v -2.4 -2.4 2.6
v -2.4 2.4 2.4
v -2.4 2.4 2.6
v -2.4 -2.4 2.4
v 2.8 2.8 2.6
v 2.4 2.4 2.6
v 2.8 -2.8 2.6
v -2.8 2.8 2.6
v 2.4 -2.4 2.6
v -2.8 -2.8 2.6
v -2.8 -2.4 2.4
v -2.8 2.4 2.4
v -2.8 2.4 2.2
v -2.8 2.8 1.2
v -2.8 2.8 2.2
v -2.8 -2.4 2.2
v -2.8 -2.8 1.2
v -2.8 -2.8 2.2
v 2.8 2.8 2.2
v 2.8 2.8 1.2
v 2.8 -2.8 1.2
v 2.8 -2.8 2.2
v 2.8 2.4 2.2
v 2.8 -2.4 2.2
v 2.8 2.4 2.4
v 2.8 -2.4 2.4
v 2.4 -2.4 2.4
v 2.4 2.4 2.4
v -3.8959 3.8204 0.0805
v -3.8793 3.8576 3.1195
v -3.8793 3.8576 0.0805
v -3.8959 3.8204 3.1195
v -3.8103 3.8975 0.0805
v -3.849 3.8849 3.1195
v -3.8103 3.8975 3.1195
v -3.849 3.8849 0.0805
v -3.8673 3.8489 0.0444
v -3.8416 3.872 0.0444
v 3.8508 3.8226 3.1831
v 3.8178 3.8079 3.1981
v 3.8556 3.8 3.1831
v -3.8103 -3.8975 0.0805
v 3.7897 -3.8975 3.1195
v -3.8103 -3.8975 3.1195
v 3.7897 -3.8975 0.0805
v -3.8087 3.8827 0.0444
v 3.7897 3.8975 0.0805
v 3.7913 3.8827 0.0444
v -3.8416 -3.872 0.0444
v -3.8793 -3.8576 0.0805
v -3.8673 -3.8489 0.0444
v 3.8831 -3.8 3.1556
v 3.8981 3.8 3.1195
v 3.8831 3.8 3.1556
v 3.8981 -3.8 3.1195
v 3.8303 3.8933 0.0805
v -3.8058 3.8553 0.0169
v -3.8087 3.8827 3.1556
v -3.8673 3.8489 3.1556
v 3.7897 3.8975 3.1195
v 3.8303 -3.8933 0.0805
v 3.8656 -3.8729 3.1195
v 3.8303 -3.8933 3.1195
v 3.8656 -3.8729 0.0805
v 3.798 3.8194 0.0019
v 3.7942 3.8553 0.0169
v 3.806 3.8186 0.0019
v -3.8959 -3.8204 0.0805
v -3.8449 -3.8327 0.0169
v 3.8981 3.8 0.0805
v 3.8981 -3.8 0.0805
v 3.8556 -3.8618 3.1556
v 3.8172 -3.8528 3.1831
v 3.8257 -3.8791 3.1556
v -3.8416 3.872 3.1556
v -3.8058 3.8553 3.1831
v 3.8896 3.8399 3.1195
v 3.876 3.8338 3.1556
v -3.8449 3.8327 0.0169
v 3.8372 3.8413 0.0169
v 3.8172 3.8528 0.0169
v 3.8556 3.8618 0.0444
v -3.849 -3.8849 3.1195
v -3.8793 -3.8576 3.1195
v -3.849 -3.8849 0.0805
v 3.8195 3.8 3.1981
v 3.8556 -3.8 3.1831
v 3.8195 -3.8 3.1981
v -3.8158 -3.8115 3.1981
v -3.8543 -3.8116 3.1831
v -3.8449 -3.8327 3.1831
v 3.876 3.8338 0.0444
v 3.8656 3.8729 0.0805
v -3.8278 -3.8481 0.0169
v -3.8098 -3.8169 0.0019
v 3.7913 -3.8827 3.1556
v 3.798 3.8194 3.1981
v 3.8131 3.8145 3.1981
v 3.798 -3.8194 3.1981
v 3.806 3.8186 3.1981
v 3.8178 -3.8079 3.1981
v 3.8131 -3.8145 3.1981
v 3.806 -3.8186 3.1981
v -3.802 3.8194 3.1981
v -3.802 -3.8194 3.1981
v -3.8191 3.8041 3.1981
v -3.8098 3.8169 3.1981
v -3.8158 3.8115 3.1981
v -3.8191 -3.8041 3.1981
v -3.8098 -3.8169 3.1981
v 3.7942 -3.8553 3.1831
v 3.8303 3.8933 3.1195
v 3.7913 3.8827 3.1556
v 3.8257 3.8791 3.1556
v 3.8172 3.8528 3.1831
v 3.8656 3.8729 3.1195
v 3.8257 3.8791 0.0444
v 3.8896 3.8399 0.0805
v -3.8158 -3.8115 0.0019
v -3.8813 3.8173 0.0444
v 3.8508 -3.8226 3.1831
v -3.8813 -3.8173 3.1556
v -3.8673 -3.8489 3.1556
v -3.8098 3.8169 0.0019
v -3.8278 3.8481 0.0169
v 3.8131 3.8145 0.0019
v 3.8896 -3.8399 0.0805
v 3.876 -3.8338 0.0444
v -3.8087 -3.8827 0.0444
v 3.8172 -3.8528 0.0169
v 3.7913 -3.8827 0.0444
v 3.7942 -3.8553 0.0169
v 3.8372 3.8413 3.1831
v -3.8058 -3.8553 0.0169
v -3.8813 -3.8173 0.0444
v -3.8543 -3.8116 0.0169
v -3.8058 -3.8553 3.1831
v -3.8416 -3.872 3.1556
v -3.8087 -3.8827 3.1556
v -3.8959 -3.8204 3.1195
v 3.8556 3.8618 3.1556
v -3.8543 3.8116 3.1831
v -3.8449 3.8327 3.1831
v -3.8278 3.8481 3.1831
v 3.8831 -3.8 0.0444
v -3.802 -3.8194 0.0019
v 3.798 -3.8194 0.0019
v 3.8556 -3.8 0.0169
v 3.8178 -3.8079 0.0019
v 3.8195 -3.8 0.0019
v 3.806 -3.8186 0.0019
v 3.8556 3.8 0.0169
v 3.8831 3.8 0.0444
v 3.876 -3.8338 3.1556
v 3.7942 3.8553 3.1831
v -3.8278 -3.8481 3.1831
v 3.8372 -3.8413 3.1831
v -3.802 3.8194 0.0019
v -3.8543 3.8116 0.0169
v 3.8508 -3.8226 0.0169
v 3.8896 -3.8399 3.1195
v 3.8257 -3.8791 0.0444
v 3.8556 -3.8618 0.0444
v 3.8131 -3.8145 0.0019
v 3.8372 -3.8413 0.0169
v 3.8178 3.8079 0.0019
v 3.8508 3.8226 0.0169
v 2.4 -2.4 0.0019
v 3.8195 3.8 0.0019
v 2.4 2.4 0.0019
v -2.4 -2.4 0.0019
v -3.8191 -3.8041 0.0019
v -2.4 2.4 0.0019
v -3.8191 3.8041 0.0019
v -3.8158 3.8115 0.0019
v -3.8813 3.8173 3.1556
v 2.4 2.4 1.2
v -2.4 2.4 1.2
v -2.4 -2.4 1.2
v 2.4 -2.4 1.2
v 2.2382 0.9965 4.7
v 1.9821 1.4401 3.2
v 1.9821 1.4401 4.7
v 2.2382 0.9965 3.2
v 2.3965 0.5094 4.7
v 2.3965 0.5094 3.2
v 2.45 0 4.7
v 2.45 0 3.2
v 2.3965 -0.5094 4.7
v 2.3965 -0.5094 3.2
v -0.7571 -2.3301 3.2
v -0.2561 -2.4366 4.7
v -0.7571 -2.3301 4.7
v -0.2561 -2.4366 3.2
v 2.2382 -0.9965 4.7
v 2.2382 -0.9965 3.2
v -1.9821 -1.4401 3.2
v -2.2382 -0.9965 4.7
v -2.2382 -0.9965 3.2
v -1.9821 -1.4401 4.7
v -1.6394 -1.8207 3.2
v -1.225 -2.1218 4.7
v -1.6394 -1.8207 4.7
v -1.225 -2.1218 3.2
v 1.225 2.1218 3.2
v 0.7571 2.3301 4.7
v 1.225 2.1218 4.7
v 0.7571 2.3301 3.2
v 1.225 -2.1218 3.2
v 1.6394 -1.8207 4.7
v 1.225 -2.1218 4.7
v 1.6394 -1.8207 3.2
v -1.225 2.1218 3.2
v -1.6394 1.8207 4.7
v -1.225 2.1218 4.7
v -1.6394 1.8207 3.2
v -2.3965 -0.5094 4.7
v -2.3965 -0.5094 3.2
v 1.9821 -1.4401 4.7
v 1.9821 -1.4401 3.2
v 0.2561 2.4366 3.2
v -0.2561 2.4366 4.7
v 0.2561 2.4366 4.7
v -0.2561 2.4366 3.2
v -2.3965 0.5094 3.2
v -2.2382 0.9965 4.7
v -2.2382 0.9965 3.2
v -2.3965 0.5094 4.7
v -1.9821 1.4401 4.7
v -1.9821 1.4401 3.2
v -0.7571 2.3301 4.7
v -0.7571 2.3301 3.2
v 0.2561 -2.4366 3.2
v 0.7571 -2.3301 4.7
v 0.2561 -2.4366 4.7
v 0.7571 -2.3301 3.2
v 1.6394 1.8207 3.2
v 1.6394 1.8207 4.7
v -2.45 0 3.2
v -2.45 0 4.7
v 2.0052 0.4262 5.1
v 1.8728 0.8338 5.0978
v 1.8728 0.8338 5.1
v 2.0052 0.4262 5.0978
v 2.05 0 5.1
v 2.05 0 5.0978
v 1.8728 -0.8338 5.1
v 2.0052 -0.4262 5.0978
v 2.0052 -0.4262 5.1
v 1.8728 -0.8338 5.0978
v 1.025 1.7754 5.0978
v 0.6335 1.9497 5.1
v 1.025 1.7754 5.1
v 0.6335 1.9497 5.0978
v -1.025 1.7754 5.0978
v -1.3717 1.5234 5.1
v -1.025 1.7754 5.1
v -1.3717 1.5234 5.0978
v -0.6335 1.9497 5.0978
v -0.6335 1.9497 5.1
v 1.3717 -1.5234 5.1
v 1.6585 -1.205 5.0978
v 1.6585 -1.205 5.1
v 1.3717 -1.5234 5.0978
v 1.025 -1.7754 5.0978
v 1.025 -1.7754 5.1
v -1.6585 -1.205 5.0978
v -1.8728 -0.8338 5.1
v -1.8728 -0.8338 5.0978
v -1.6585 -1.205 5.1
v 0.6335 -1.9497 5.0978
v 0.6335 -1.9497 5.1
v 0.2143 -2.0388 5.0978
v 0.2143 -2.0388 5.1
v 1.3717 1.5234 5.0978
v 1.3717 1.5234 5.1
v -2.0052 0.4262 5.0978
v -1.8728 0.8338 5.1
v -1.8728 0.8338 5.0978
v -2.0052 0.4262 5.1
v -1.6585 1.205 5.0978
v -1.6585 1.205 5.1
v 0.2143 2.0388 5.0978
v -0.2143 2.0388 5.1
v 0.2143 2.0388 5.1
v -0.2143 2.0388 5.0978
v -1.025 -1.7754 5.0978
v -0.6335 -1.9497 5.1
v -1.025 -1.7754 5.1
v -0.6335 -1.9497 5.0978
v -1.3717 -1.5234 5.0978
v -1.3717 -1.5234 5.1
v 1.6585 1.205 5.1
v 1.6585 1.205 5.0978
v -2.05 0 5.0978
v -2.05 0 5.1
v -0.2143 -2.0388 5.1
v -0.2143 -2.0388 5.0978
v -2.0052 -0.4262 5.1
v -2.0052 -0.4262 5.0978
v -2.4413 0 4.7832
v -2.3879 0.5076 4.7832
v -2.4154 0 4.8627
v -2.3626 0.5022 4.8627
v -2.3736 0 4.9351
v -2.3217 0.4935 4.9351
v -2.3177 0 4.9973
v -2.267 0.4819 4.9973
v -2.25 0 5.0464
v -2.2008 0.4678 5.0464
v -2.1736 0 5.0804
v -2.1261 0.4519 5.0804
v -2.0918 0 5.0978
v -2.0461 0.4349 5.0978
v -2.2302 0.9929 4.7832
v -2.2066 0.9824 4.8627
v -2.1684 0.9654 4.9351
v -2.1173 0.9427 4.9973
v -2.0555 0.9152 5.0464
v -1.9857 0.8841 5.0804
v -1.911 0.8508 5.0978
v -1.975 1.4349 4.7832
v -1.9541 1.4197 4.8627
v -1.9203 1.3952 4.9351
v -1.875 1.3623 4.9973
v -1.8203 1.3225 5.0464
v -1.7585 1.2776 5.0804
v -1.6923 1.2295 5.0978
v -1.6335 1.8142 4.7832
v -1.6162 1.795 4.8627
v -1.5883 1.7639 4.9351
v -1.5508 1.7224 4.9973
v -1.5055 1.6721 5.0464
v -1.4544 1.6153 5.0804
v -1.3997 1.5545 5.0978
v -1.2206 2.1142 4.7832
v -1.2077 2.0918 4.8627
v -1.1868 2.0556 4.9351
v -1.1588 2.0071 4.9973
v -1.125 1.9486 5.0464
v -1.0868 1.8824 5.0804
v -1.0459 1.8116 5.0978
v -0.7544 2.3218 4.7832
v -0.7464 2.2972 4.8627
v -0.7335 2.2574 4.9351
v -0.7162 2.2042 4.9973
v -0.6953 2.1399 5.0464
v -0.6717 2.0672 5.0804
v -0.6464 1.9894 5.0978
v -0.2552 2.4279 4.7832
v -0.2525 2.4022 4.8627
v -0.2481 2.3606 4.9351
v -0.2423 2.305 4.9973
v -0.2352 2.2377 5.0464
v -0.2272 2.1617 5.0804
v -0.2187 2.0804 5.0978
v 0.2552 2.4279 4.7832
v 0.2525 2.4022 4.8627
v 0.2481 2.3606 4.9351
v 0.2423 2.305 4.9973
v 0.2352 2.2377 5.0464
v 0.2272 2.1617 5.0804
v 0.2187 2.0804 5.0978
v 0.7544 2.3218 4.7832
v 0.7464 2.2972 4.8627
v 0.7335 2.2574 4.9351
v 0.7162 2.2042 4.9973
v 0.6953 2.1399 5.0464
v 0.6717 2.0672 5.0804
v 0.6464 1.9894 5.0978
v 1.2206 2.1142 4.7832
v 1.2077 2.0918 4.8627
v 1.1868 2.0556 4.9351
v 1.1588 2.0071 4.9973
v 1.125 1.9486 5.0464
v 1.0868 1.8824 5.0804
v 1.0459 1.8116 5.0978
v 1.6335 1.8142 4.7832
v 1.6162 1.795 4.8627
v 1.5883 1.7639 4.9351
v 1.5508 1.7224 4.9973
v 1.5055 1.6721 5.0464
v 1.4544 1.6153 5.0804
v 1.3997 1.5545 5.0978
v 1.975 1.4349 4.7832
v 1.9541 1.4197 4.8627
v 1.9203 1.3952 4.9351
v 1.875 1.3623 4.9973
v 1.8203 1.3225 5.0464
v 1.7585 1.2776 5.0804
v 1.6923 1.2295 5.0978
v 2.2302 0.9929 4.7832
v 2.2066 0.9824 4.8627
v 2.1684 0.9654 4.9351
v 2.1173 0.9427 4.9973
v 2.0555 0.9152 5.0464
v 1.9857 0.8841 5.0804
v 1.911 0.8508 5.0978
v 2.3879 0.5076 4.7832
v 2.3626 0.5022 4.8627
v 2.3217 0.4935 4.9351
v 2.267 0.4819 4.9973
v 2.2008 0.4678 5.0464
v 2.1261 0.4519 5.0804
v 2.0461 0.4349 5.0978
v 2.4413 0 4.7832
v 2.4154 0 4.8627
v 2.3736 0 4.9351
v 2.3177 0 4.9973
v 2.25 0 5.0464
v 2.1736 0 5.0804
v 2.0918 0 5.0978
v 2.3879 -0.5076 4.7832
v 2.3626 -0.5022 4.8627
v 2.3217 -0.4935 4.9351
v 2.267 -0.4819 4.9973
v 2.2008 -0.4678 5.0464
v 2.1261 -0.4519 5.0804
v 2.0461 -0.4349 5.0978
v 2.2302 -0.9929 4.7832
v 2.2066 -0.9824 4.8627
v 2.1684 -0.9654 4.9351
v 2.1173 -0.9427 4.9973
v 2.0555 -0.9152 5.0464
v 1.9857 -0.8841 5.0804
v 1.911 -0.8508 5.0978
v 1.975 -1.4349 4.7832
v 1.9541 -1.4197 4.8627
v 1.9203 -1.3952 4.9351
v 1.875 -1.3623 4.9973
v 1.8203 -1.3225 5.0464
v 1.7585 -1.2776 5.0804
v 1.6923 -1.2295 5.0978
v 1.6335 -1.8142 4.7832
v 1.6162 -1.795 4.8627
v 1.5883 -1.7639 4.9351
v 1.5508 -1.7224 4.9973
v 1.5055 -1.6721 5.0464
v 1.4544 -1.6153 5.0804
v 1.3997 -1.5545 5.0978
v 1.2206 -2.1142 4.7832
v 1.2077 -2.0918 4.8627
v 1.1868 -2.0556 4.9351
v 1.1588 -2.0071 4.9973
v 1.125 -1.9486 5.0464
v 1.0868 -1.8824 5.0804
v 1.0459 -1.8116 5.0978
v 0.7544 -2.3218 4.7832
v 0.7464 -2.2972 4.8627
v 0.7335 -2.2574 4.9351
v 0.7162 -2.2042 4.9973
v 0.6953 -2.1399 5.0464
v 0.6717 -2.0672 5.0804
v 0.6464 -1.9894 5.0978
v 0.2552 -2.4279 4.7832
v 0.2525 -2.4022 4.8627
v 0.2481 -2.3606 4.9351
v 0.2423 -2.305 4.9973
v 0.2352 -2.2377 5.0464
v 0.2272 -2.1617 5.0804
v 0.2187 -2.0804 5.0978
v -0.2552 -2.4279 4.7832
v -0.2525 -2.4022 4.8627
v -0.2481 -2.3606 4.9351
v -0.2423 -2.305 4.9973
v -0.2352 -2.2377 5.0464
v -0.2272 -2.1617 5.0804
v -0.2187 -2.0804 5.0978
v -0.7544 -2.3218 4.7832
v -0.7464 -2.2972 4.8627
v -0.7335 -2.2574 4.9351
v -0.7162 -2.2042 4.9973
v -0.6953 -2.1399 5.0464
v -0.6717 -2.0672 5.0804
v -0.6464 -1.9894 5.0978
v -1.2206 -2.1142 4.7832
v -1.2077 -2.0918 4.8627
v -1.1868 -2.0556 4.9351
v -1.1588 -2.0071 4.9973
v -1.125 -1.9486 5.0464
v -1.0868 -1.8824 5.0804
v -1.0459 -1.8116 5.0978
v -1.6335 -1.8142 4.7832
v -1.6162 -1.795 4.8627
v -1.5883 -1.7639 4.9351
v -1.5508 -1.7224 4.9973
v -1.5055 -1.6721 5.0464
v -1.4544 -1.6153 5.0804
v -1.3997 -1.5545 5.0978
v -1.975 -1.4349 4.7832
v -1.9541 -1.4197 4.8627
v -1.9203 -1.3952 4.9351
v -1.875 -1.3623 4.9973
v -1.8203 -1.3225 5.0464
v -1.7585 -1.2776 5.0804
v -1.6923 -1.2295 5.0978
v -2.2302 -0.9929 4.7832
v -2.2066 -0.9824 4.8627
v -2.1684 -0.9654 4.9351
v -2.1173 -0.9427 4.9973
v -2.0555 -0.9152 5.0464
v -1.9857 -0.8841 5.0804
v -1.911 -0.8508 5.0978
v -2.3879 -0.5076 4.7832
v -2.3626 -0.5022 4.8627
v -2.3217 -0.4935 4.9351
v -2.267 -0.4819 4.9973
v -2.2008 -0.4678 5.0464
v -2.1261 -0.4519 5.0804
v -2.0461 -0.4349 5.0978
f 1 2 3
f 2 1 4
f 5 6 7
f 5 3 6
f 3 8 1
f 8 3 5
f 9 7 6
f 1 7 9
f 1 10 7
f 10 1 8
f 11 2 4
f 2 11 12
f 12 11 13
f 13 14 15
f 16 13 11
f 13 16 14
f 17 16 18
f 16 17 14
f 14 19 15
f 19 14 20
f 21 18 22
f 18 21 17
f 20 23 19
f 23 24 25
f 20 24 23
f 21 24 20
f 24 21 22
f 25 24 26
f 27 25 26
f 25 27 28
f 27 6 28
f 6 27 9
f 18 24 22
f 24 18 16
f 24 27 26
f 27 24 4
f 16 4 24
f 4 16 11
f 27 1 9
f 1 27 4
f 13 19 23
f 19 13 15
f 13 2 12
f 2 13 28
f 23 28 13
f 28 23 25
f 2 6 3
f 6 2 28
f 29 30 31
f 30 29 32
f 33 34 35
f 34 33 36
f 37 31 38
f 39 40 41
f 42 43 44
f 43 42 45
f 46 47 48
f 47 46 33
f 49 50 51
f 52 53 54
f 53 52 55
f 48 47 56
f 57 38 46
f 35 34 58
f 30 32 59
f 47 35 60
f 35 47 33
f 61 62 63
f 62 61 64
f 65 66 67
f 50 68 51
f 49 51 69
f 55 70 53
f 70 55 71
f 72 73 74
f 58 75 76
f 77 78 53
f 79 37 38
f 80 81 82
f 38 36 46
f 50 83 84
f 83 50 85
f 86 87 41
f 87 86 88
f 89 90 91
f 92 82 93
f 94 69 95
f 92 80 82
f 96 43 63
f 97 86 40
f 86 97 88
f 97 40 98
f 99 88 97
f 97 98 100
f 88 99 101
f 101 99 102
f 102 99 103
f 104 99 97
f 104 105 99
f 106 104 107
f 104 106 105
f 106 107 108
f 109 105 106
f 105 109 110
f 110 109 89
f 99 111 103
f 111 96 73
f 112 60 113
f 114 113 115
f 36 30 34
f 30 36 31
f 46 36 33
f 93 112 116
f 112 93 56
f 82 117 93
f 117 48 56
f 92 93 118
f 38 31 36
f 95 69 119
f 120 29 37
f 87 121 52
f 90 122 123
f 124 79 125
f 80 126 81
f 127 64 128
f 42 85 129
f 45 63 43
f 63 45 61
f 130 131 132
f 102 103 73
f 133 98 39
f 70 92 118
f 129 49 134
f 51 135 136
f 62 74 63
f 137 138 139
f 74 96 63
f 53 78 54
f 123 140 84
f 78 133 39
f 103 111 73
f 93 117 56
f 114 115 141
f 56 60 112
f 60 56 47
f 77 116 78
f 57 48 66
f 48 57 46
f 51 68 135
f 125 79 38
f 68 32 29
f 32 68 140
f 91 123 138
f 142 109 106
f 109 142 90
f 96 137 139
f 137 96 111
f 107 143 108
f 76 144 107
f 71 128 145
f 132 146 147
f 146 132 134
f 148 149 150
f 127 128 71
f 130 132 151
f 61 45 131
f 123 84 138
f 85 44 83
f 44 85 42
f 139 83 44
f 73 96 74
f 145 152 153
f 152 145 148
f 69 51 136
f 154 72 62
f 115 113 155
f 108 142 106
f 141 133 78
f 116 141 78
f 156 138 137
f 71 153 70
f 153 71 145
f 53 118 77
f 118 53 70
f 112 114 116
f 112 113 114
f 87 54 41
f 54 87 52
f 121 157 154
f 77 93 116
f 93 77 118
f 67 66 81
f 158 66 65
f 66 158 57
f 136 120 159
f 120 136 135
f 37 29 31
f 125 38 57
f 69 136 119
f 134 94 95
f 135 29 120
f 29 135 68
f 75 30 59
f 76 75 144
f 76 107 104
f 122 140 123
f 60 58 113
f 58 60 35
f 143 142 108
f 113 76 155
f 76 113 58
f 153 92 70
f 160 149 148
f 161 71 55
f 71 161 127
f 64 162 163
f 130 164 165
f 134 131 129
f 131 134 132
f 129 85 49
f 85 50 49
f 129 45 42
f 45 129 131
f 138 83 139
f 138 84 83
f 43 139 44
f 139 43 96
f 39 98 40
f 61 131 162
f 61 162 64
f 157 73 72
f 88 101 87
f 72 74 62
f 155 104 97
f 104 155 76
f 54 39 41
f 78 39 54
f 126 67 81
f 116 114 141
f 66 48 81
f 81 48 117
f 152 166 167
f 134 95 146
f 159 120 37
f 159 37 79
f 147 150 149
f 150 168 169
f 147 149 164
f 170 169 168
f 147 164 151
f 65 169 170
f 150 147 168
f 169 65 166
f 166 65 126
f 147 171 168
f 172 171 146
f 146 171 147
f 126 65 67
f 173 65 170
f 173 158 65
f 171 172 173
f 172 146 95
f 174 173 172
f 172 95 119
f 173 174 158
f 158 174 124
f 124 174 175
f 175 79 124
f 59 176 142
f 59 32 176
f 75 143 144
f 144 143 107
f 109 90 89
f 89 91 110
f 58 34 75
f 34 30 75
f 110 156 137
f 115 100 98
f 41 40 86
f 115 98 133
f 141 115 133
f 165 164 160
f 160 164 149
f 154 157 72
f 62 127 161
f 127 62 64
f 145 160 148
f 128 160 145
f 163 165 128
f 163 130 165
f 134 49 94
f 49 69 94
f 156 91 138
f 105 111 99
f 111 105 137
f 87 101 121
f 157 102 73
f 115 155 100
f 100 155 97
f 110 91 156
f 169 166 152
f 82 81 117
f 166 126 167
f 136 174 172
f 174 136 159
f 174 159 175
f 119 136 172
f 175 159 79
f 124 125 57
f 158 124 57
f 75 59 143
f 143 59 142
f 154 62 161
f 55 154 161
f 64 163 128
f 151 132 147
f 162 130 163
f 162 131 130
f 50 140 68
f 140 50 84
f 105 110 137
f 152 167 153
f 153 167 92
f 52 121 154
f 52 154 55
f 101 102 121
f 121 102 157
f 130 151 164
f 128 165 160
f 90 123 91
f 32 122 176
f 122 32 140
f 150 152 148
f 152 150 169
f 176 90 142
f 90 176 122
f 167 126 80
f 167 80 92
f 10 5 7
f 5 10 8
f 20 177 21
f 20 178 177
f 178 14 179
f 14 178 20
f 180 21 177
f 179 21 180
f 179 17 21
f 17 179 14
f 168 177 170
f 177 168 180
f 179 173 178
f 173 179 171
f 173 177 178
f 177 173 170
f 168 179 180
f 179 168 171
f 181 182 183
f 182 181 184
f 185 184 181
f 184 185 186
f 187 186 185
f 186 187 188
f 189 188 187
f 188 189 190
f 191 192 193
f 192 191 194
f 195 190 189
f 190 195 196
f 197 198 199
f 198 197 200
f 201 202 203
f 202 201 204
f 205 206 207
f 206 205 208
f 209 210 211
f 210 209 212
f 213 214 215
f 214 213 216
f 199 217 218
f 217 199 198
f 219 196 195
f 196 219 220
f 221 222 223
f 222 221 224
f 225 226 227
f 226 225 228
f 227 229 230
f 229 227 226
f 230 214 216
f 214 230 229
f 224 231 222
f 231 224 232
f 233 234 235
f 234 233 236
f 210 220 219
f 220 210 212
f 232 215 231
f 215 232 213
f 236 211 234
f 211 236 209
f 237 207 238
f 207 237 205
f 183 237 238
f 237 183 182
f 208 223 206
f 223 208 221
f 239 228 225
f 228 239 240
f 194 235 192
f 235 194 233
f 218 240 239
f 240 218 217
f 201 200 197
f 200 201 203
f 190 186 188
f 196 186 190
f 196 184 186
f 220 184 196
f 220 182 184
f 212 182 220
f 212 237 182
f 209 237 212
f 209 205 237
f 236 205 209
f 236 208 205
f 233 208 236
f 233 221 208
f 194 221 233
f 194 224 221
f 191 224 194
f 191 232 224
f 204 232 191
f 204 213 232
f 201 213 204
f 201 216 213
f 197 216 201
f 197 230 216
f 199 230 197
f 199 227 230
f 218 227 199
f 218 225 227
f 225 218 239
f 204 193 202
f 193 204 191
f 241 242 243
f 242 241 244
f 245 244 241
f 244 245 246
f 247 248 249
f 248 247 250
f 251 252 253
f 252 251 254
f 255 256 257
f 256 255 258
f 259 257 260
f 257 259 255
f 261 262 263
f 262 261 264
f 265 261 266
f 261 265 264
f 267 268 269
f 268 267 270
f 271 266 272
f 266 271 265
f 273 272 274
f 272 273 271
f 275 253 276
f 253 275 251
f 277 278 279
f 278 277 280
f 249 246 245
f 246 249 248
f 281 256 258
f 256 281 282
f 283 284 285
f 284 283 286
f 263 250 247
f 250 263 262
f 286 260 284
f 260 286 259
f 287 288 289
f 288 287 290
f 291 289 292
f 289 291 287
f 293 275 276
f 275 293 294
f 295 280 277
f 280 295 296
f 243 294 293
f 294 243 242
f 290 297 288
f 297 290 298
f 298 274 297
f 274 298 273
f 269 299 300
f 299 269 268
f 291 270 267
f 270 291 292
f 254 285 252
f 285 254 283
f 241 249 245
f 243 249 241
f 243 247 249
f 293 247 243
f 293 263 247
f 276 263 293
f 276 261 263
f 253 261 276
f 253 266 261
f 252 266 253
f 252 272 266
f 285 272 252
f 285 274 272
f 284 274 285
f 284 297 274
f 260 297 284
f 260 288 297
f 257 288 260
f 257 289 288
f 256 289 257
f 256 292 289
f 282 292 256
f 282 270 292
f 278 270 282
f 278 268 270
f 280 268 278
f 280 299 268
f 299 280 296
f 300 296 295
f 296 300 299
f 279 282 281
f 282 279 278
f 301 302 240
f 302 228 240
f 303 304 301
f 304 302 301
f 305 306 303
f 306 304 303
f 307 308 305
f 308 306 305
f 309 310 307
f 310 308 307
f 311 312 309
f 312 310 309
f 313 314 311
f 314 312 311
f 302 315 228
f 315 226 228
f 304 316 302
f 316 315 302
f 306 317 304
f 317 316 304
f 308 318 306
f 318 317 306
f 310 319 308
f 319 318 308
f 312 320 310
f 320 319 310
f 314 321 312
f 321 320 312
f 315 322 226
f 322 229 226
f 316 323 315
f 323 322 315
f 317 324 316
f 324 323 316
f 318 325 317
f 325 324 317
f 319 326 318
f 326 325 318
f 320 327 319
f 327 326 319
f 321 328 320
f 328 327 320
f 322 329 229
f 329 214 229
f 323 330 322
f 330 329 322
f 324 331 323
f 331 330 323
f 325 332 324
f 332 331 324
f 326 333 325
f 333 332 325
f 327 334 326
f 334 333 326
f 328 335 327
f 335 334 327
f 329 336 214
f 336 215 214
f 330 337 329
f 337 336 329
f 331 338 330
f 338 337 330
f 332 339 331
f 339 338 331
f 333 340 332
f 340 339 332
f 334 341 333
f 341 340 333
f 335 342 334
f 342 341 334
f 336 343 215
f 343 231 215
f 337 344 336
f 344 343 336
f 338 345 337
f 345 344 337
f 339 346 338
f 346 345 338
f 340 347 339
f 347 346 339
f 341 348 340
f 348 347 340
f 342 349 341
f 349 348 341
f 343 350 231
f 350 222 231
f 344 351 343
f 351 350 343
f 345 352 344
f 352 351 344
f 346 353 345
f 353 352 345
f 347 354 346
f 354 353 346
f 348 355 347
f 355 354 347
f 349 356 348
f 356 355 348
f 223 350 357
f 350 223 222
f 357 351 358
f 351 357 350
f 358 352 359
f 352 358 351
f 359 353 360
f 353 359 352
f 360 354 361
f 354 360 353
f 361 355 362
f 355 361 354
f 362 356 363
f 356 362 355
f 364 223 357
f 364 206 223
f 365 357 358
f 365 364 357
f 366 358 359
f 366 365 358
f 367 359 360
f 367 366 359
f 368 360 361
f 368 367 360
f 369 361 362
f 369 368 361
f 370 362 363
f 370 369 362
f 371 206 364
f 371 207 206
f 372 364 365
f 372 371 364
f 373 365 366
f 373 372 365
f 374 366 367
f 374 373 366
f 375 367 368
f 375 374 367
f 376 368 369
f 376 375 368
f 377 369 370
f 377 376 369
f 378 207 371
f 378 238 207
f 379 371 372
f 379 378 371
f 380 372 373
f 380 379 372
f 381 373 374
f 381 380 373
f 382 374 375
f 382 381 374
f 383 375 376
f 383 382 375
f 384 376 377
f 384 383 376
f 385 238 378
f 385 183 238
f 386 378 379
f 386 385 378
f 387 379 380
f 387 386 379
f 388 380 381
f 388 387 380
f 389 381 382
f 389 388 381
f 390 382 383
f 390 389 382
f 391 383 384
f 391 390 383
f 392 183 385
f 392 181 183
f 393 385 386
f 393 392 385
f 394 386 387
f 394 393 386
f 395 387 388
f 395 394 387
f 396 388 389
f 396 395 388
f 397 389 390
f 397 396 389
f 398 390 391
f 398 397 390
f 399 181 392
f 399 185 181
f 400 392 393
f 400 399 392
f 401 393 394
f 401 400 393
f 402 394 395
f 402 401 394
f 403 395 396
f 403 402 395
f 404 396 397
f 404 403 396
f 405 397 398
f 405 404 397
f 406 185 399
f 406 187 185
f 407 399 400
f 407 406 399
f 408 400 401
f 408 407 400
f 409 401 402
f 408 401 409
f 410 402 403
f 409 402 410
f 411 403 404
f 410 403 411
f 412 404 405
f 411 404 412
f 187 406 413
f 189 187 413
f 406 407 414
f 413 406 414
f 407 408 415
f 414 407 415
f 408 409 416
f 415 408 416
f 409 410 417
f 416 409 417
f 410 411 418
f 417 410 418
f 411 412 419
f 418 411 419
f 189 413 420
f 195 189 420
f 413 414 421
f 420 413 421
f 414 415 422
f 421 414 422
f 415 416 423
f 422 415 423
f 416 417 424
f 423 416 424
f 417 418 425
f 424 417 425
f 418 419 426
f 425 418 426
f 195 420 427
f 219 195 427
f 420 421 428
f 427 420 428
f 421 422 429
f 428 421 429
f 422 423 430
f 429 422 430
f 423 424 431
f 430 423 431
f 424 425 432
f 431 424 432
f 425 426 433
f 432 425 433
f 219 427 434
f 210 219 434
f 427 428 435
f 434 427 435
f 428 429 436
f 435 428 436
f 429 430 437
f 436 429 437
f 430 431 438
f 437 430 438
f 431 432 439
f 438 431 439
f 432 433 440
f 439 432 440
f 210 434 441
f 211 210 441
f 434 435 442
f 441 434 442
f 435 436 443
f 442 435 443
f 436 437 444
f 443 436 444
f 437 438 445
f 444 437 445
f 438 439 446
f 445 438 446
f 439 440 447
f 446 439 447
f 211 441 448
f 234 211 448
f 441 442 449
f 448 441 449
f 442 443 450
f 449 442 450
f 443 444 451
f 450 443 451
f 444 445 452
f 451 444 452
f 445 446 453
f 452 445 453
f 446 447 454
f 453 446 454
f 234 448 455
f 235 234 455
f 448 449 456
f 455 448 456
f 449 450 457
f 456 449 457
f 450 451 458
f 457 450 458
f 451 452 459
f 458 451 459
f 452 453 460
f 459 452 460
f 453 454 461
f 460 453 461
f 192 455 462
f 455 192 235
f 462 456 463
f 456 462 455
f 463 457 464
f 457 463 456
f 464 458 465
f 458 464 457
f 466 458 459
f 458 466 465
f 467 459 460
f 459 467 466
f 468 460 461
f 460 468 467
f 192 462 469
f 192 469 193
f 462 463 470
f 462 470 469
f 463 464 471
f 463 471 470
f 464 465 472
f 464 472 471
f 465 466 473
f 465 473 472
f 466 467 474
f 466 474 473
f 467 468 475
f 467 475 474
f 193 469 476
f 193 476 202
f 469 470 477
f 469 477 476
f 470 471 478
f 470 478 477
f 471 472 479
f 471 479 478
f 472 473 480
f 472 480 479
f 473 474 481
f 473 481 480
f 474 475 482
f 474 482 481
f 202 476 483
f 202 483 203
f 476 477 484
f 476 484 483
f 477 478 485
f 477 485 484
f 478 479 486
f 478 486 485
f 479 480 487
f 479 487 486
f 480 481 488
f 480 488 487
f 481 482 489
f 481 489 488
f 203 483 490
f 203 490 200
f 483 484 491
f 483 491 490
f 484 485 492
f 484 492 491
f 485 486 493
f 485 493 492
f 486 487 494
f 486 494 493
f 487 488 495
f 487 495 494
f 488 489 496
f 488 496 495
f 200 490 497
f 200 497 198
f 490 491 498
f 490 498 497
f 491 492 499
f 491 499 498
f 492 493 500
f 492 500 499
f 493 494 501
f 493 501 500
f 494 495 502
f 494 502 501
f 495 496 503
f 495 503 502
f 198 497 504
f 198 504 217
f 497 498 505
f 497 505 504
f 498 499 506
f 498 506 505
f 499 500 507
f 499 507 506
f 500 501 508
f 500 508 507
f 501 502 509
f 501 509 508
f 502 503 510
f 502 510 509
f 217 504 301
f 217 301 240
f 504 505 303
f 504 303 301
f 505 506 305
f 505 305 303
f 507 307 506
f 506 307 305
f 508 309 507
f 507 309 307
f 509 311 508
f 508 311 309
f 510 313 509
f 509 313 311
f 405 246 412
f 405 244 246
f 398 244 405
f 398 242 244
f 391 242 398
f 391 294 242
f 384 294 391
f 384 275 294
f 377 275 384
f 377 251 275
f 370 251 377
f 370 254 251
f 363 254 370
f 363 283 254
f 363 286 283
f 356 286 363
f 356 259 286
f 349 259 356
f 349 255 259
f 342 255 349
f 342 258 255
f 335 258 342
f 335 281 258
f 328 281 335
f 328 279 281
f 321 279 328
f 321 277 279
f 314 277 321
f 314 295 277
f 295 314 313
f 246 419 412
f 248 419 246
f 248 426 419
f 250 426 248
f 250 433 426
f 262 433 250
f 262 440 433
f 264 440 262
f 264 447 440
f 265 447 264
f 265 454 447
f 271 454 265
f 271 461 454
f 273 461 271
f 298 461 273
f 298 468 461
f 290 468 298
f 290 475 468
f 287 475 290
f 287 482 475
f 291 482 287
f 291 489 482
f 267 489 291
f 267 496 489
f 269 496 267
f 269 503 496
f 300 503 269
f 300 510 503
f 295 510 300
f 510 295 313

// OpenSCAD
// file: ../../lib/roundedcube_simple.scad
/**
* Machine Blocks
* https://machinemania.net/blocks 
*
* Module for simple rounded cubes
* Copyright (c) 2022 Jan Philipp Knoeller <pk@pksoftware.de>
*
* Published under license:
* Creative Commons Attribution-NonCommercial-ShareAlike 4.0 International 
* https://creativecommons.org/licenses/by-nc-sa/4.0/
*
*/
module roundedcube_simple(size = [1, 1, 1], center = false, radius = 0.5, resolution = 20) {
	// If single value, convert to [x, y, z] vector
	size = (size[0] == undef) ? [size, size, size] : size;

	translate = (center == false) ?
		[radius, radius, radius] :
		[
			radius - (size[0] / 2),
			radius - (size[1] / 2),
			radius - (size[2] / 2)
	];

	translate(v = translate)
	minkowski() {
		cube(size = [
			size[0] - (radius * 2),
			size[1] - (radius * 2),
			size[2] - (radius * 2)
		]);
		sphere(r = radius, $fn = resolution);
	}
}
// file: ../../lib/roundedcube.scad
// More information: https://danielupshaw.com/openscad-rounded-corners/

// Set to 0.01 for higher definition curves (renders slower)
$fs = 0.15;

module roundedcube(size = [1, 1, 1], center = false, radius = 0.5, apply_to = "all", resolution = 20) {
	// If single value, convert to [x, y, z] vector
	size = (size[0] == undef) ? [size, size, size] : size;

	translate_min = radius;
	translate_xmax = size[0] - radius;
	translate_ymax = size[1] - radius;
	translate_zmax = size[2] - radius;

	diameter = radius * 2;

	obj_translate = (center == false) ?
		[0, 0, 0] : [
			-(size[0] / 2),
			-(size[1] / 2),
			-(size[2] / 2)
		];

	translate(v = obj_translate) {
		hull() {
			for (translate_x = [translate_min, translate_xmax]) {
				x_at = (translate_x == translate_min) ? "min" : "max";
				for (translate_y = [translate_min, translate_ymax]) {
					y_at = (translate_y == translate_min) ? "min" : "max";
					for (translate_z = [translate_min, translate_zmax]) {
						z_at = (translate_z == translate_min) ? "min" : "max";

						translate(v = [translate_x, translate_y, translate_z])
						if (
							(apply_to == "all") ||
							(apply_to == "xmin" && x_at == "min") || (apply_to == "xmax" && x_at == "max") ||
							(apply_to == "ymin" && y_at == "min") || (apply_to == "ymax" && y_at == "max") ||
							(apply_to == "zmin" && z_at == "min") || (apply_to == "zmax" && z_at == "max")
						) {
							sphere(r = radius, $fn = resolution);
						} else {
							rotate = 
								(apply_to == "xmin" || apply_to == "xmax" || apply_to == "x") ? [0, 90, 0] : (
								(apply_to == "ymin" || apply_to == "ymax" || apply_to == "y") ? [90, 90, 0] :
								[0, 0, 0]
							);
							rotate(a = rotate)
							cylinder(h = diameter, r = radius, center = true, $fn = resolution);
						}
					}
				}
			}
		}
	}
}
// main file
/**
* Machine Blocks
* https://machinemania.net/blocks 
*
* Plate 1x1
* Copyright (c) 2022 Jan Philipp Knoeller <pk@pksoftware.de>
*
* Published under license:
* Creative Commons Attribution-NonCommercial-ShareAlike 4.0 International 
* https://creativecommons.org/licenses/by-nc-sa/4.0/
*
*/
echo(version=version());

include <../../lib/block-v2.scad>;

color([0.376, 0.768, 0.058])
block(grid=[1,1], adjustSize=[0,0,0,0]);


block(grid=[1,1]);
